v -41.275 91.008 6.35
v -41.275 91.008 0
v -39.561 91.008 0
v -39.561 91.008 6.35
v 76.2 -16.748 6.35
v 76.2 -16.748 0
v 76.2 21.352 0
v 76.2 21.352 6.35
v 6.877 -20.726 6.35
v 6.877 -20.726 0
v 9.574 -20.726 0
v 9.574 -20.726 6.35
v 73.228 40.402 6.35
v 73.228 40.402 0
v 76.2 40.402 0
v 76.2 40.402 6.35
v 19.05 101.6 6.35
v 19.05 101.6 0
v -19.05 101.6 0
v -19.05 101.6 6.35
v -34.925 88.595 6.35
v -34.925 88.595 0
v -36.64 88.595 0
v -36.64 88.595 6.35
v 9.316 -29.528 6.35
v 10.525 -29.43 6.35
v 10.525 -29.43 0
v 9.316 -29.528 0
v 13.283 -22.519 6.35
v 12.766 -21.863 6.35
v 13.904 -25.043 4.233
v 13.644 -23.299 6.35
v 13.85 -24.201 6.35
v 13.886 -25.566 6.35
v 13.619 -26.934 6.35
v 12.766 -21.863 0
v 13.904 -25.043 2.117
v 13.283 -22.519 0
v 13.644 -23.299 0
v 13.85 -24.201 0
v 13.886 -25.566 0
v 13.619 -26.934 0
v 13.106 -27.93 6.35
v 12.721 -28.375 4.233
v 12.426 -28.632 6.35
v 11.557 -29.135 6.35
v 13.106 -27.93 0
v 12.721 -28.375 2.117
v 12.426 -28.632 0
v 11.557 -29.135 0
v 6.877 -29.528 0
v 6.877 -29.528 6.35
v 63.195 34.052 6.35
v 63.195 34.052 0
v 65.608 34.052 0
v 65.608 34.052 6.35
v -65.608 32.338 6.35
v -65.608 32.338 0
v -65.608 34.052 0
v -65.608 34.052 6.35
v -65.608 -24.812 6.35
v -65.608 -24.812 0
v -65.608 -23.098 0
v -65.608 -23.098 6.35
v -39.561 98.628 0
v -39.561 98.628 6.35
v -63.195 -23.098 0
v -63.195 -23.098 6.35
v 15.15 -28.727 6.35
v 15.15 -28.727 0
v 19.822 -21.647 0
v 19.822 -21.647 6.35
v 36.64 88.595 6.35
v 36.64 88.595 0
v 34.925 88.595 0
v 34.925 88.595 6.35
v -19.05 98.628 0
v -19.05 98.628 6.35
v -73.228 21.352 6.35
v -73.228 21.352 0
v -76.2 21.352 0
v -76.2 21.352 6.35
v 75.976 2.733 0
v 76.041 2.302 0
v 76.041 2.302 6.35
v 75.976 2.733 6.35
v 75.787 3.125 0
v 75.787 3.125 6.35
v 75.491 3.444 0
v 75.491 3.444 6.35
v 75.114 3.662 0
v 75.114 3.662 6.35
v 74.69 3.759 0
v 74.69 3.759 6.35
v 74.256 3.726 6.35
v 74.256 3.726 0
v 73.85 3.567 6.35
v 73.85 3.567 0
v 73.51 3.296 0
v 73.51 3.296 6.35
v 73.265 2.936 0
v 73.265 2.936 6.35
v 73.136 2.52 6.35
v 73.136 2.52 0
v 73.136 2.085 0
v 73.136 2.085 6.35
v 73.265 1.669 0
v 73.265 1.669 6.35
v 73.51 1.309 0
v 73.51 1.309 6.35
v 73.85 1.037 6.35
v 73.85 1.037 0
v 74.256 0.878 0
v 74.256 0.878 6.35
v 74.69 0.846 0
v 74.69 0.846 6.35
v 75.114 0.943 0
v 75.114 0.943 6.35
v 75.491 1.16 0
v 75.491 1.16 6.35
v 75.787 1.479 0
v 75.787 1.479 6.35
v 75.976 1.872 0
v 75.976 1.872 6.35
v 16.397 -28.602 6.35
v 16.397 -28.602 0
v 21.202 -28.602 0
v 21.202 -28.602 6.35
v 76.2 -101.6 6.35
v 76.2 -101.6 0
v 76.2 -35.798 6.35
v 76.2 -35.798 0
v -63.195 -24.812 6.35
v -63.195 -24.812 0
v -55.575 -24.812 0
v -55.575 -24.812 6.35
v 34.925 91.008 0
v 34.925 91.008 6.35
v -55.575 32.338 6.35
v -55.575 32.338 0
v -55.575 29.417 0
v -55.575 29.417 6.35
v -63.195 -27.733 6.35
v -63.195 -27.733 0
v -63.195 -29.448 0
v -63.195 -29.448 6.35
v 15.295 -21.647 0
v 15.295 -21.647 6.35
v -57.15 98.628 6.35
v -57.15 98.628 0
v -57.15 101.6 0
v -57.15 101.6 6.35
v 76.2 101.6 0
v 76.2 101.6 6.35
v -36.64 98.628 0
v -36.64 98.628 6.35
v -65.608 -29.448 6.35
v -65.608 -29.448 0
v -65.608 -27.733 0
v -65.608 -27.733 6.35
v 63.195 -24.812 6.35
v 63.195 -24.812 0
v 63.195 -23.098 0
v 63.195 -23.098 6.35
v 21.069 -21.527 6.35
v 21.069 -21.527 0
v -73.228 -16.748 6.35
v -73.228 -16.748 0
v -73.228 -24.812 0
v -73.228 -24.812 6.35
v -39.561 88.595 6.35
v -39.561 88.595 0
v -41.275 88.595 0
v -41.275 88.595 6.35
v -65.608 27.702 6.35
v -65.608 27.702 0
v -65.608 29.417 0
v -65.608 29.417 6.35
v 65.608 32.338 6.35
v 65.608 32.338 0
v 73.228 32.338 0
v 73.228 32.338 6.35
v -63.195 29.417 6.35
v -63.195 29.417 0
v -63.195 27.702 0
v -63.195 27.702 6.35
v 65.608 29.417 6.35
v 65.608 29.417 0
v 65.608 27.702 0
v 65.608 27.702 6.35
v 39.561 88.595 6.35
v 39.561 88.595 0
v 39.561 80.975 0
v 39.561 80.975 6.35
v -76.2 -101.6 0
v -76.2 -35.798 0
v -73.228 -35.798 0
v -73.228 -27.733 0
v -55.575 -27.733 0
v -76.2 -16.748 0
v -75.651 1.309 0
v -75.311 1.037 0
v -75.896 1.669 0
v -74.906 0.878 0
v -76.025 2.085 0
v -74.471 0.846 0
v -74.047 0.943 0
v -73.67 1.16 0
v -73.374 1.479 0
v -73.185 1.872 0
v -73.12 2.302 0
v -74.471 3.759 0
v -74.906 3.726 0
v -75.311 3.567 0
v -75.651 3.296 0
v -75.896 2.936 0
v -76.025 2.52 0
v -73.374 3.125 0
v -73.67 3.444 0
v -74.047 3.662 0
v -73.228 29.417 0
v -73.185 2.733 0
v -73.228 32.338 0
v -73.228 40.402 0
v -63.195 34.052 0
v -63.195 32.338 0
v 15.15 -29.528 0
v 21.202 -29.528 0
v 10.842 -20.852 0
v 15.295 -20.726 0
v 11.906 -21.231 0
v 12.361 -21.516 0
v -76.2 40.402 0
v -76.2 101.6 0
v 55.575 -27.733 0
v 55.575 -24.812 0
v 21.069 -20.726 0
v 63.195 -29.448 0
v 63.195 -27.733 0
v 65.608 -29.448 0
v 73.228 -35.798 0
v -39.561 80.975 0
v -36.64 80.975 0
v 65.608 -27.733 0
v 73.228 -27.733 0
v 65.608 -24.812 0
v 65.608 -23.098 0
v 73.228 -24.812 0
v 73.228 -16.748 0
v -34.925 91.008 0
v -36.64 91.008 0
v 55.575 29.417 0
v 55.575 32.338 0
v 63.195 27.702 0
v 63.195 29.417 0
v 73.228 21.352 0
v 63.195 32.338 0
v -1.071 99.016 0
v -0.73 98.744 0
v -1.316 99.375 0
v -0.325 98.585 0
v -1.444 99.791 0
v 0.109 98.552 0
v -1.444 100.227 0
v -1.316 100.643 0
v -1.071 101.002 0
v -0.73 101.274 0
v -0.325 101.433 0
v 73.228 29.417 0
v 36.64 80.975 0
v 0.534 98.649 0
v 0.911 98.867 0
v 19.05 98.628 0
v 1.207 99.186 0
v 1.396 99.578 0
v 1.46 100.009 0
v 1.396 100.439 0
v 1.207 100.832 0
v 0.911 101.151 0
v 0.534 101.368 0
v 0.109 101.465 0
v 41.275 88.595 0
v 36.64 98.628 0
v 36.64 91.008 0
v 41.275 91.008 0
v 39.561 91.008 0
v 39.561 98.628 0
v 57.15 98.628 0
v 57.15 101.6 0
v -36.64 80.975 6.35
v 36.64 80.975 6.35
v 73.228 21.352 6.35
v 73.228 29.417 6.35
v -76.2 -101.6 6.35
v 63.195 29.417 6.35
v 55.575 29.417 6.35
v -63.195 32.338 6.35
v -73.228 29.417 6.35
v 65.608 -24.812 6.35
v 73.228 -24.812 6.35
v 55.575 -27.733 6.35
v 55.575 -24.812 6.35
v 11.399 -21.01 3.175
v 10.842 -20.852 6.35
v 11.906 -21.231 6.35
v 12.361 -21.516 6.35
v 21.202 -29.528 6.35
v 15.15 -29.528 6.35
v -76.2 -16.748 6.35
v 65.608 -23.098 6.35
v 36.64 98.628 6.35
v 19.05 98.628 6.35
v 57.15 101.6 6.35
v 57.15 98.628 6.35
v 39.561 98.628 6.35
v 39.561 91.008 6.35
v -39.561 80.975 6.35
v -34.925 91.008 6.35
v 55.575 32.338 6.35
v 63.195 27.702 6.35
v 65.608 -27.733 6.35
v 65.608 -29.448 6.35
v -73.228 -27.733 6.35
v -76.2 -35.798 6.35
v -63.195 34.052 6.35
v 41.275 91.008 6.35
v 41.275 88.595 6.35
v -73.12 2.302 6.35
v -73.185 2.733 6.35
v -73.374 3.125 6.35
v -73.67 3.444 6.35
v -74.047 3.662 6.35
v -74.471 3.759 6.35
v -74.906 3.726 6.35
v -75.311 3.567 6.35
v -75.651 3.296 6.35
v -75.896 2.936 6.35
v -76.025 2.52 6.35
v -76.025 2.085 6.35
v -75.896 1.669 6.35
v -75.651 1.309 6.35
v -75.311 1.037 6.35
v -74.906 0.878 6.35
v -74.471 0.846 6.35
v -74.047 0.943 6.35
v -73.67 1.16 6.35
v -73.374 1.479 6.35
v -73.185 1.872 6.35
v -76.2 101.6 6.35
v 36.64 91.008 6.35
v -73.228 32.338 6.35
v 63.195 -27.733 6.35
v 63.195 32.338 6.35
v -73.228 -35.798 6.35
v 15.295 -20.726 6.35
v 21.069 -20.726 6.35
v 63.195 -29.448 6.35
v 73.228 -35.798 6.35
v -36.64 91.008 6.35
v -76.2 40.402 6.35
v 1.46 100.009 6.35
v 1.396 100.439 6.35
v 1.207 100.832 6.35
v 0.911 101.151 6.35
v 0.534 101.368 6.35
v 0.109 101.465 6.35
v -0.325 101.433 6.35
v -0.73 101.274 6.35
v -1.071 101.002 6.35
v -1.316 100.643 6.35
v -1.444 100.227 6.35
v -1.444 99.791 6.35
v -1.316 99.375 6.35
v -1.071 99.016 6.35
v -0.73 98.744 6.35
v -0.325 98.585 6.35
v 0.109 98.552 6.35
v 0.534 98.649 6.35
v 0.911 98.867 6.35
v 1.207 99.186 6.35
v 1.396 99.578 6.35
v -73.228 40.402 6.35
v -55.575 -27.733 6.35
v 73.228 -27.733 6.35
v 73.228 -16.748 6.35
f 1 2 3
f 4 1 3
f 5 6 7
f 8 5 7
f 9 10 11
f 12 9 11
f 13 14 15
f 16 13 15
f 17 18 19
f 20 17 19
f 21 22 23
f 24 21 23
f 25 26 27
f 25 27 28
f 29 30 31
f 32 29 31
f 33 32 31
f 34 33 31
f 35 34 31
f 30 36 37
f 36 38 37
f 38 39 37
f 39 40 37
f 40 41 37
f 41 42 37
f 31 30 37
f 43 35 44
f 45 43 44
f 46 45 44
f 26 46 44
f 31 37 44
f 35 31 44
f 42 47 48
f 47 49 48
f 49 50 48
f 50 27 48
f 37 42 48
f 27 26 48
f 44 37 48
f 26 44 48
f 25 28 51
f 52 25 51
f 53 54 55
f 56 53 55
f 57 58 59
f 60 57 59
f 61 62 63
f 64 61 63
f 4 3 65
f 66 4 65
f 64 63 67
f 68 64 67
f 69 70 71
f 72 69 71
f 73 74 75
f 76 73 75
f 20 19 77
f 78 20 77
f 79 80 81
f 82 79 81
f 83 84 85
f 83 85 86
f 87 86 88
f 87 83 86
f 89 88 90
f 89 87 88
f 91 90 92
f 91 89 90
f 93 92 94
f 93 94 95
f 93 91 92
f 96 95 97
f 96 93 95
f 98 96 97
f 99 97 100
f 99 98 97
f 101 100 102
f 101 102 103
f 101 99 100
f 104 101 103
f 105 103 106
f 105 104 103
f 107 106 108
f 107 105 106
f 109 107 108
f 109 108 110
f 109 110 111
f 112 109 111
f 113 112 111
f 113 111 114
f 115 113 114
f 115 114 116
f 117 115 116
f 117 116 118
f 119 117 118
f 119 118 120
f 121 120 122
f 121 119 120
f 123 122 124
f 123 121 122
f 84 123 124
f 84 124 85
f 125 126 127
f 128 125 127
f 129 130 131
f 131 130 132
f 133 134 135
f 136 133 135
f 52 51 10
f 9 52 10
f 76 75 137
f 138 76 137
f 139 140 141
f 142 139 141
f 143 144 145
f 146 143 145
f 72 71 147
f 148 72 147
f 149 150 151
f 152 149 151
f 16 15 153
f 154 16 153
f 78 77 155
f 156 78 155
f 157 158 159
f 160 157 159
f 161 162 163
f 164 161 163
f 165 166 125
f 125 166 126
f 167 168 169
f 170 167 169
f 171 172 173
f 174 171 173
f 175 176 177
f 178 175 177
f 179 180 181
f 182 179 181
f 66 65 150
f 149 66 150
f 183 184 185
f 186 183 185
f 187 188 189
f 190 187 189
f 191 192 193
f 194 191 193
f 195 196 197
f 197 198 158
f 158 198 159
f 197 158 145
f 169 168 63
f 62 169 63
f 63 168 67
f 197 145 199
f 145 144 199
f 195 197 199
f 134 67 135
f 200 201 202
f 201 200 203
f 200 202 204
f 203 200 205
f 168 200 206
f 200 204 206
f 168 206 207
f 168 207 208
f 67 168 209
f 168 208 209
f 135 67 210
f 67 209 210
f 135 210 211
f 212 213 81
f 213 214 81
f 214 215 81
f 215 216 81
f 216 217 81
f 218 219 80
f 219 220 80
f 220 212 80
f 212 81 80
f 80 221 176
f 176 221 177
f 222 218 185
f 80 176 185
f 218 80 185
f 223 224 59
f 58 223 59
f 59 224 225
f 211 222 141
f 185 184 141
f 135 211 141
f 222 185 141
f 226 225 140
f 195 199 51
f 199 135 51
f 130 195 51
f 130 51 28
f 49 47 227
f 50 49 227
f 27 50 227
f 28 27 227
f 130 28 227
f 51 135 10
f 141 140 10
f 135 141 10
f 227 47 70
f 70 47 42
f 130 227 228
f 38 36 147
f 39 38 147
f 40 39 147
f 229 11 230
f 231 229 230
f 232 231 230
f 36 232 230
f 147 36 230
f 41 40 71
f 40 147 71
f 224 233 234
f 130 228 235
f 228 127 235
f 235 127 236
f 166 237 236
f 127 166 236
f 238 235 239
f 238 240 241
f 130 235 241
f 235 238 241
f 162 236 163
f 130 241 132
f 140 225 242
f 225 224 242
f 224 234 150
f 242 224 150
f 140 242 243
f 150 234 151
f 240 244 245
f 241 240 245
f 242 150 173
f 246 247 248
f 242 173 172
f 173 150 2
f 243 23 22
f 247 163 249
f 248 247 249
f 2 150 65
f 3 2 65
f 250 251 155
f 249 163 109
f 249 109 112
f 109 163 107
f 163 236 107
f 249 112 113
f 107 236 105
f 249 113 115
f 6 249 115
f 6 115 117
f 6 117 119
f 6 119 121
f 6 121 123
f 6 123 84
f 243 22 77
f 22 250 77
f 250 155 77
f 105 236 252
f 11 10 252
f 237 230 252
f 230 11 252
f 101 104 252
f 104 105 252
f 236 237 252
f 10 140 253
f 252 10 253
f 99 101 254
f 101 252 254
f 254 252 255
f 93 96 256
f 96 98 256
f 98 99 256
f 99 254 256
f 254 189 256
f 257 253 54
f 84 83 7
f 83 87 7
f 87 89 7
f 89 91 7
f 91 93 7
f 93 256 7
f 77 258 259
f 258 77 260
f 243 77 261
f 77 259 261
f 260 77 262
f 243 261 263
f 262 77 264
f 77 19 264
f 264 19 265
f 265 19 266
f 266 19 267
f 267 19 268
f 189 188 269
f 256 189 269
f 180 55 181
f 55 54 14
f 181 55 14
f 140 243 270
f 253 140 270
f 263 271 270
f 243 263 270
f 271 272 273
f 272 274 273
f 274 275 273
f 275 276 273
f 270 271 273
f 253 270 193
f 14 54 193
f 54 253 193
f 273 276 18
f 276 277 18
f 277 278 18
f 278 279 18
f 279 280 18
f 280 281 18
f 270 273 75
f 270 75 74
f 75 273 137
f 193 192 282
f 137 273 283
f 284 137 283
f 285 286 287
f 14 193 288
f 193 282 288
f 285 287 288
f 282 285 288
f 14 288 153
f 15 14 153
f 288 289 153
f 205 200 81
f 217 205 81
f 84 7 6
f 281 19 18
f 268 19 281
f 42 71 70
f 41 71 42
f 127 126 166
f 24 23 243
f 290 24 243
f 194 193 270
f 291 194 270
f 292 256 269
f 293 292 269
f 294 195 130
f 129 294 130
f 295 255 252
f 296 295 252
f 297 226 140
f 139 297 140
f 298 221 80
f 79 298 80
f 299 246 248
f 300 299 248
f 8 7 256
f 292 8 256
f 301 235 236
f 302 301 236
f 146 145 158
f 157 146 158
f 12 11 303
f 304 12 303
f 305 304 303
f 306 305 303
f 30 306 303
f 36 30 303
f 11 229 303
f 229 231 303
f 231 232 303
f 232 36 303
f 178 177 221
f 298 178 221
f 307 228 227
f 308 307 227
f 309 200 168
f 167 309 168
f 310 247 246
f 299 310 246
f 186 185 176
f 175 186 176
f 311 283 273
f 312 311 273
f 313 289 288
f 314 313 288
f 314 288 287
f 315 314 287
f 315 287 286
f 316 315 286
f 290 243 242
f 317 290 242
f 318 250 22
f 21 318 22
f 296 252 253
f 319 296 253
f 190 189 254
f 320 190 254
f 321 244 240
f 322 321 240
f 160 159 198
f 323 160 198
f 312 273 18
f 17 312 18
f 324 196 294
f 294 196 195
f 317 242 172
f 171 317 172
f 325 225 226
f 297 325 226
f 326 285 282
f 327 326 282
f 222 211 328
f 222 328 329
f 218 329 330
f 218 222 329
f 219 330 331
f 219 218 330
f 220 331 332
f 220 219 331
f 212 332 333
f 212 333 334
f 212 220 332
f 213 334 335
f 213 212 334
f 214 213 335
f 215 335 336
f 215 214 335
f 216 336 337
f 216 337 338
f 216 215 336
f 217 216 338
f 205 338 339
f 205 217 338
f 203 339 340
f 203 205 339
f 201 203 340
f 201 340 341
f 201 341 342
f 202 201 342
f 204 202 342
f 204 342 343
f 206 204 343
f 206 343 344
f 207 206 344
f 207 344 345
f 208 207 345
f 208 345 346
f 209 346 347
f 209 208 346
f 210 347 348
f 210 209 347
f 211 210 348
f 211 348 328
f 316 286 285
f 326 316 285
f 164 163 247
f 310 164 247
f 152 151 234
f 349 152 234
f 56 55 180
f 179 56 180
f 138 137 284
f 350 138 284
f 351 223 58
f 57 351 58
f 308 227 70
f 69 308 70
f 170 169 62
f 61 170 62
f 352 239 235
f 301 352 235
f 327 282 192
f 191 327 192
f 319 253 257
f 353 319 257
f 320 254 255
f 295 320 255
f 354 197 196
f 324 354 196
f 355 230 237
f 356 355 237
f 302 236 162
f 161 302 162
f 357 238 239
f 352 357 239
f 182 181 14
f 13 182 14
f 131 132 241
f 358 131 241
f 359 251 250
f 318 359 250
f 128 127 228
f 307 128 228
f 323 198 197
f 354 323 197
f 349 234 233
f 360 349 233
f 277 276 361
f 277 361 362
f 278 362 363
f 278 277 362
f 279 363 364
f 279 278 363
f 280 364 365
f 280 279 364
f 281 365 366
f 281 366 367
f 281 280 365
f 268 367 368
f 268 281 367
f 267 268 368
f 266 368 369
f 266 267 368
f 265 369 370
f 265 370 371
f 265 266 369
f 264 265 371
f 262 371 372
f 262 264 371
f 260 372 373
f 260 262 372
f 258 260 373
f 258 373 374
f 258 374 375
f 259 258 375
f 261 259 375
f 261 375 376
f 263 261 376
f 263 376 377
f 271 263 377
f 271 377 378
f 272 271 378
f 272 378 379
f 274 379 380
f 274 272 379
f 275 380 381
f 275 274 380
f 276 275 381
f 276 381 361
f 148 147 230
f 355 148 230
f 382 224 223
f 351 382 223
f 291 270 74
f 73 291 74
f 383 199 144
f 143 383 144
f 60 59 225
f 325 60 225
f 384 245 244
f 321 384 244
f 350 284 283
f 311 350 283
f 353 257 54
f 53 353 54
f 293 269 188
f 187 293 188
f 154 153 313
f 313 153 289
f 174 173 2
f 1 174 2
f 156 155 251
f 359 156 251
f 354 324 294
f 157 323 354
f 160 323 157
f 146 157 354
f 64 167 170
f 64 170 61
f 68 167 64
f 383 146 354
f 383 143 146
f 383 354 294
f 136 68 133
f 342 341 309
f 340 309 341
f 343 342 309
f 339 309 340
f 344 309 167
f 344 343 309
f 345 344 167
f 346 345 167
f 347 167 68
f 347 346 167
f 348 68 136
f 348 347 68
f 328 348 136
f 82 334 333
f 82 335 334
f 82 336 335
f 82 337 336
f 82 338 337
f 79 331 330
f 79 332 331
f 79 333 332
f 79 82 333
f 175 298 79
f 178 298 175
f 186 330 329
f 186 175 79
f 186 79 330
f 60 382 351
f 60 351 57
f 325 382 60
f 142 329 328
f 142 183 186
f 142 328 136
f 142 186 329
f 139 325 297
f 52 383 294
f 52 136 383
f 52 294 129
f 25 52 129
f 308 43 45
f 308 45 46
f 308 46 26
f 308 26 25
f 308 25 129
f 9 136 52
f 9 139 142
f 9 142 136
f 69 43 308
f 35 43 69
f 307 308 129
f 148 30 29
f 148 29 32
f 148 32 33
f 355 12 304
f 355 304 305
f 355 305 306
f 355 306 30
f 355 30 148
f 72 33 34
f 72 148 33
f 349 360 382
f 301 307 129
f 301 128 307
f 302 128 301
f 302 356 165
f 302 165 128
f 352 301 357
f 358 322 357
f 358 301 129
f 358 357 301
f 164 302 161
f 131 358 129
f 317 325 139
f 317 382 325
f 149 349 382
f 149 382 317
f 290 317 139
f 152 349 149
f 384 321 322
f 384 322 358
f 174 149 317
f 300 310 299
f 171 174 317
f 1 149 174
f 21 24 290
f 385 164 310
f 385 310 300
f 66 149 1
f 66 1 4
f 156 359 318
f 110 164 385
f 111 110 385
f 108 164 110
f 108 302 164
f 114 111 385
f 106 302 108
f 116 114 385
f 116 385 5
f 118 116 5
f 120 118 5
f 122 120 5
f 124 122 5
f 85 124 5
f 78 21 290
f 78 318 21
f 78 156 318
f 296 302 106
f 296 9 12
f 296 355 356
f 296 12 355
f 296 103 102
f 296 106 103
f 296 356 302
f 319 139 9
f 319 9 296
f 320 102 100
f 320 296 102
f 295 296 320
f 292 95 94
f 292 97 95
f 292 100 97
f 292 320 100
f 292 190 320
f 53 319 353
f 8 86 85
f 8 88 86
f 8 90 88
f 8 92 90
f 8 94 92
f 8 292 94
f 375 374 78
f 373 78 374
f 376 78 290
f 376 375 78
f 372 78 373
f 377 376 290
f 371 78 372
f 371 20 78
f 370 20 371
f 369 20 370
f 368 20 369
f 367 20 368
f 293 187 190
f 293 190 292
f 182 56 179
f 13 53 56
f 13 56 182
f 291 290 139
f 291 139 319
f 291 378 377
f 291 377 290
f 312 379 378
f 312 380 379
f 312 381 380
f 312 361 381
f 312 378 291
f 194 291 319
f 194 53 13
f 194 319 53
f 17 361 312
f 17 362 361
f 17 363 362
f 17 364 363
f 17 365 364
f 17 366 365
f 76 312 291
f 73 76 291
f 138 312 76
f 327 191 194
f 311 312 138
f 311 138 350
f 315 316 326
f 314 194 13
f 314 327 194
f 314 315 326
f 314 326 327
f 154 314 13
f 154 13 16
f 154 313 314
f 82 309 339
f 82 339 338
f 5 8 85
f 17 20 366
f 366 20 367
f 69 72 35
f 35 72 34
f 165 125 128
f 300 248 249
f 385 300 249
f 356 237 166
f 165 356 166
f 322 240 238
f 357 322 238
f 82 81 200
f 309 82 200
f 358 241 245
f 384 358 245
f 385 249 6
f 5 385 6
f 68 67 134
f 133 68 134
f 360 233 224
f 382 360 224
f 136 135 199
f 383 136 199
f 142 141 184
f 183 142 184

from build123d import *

# Parameters (mm, degrees)
F0_R     = 1.4605
F1_DEPTH = 6.35


# Not quite as in the source:
# - a feature names something its author has since deleted; it is built from what else it names


with BuildPart() as f1:
    # F0 (on Top) → F1 (new body)
    with BuildSketch(Plane.XY):
        Polygon((-57.1500000004, 101.5999999999), (-76.2, 101.5999999999), (-76.2, 40.4022223395), (-73.2282, 40.4022223395), (-73.2282, 32.3377223395), (-65.6082, 32.3377223395), (-65.6082, 34.0522223395), (-63.1952, 34.0522223395), (-63.1952, 32.3377223395), (-55.5752, 32.3377223395), (-55.5752, 30.8772223395), (-55.5752, 29.4167223395), (-63.1952, 29.4167223395), (-63.1952, 27.7022223395), (-65.6082, 27.7022223395), (-65.6082, 29.4167223395), (-73.2282, 29.4167223395), (-73.2282, 21.3522223395), (-76.2, 21.3522223395), (-76.2, -16.7477776605), (-73.2282, -16.7477776605), (-73.2282, -24.8122776605), (-65.6082, -24.8122776605), (-65.6082, -23.0977776605), (-63.1952, -23.0977776605), (-63.1952, -24.8122776605), (-55.5752, -24.8122776605), (-55.5752, -26.2727776605), (-55.5752, -27.7332776605), (-63.1952, -27.7332776605), (-63.1952, -29.4477776605), (-65.6082, -29.4477776605), (-65.6082, -27.7332776605), (-73.2282, -27.7332776605), (-73.2282, -35.7977776604), (-76.2, -35.7977776604), (-76.2, -101.5999999999), (76.2, -101.5999999999), (76.2, -35.7977776604), (73.2282, -35.7977776604), (73.2282, -27.7332776605), (65.6082, -27.7332776605), (65.6082, -29.4477776605), (63.1952, -29.4477776605), (63.1952, -27.7332776605), (55.5752, -27.7332776605), (55.5752, -26.2727776605), (55.5752, -24.8122776605), (63.1952, -24.8122776605), (63.1952, -23.0977776605), (65.6082, -23.0977776605), (65.6082, -24.8122776605), (73.2282, -24.8122776605), (73.2282, -16.7477776605), (76.2, -16.7477776605), (76.2, 21.3522223395), (73.2282, 21.3522223395), (73.2282, 29.4167223395), (65.6082, 29.4167223395), (65.6082, 27.7022223395), (63.1952, 27.7022223395), (63.1952, 29.4167223395), (55.5752, 29.4167223395), (55.5752, 30.8772223395), (55.5752, 32.3377223395), (63.1952, 32.3377223395), (63.1952, 34.0522223395), (65.6082, 34.0522223395), (65.6082, 32.3377223395), (73.2282, 32.3377223395), (73.2282, 40.4022223395), (76.2, 40.4022223395), (76.2, 101.5999999999), (57.1499999998, 101.5999999999), (57.1499999998, 98.6281999999), (39.5605000002, 98.6281999999), (39.5605000002, 91.0081999999), (41.2750000002, 91.0081999999), (41.2750000002, 88.5951999999), (39.5605000002, 88.5951999999), (39.5605000002, 80.9751999999), (38.1000000002, 80.9751999999), (36.6395000002, 80.9751999999), (36.6395000002, 88.5951999999), (34.9250000002, 88.5951999999), (34.9250000002, 91.0081999999), (36.6395000002, 91.0081999999), (36.6395000002, 98.6281999999), (19.05, 98.6281999999), (19.05, 101.5999999999), (-19.05, 101.5999999999), (-19.05, 98.6281999999), (-21.3974503974, 98.6281999999), (-36.6395000002, 98.6281999999), (-36.6395000002, 91.0081999999), (-34.9250000002, 91.0081999999), (-34.9250000002, 88.5951999999), (-36.6395000002, 88.5951999999), (-36.6395000002, 80.9751999999), (-38.1000000002, 80.9751999999), (-39.5605000002, 80.9751999999), (-39.5605000002, 88.5951999999), (-41.2750000002, 88.5951999999), (-41.2750000002, 91.0081999999), (-39.5605000002, 91.0081999999), (-39.5605000002, 98.6281999999), (-57.1500000004, 98.6281999999), align=None)
        with BuildLine():
            add(Edge.make_bspline(
                [(12.7658935974, -21.8633876268), (13.9035680881, -23.0010621174), (13.9035680881, -25.0432889762)],
                knots=[0, 0, 0, 1, 1, 1], degree=2))
            add(Edge.make_bspline(
                [(13.9035680881, -25.0432889762), (13.9035680881, -27.2223065019), (12.7206178133, -28.3753940255)],
                knots=[0, 0, 0, 1, 1, 1], degree=2))
            add(Edge.make_bspline(
                [(12.7206178133, -28.3753940255), (11.5376675385, -29.5284815491), (9.3162641723, -29.5284815491)],
                knots=[0, 0, 0, 1, 1, 1], degree=2))
            Line((9.3162641723, -29.5284815491), (6.8771517165, -29.5284815491))
            Line((6.8771517165, -29.5284815491), (6.8771517165, -20.7257131361))
            Line((6.8771517165, -20.7257131361), (9.5744324733, -20.7257131361))
            add(Edge.make_bspline(
                [(9.5744324733, -20.7257131361), (11.6282191068, -20.7257131361), (12.7658935974, -21.8633876268)],
                knots=[0, 0, 0, 1, 1, 1], degree=2))
        make_face(mode=Mode.SUBTRACT)
        Polygon((21.2016391646, -28.6017729462), (21.2016391646, -29.5284815491), (15.1500971236, -29.5284815491), (15.1500971236, -28.7270038385), (19.8221727203, -21.6466418517), (15.294594307, -21.6466418517), (15.294594307, -20.7257131361), (21.0687017558, -20.7257131361), (21.0687017558, -21.5271908467), (16.3966261591, -28.6017729462), align=None, mode=Mode.SUBTRACT)
        with Locations((-74.5805352926, 2.3022223395)):
            Circle(F0_R, mode=Mode.SUBTRACT)
        with Locations((74.5805352926, 2.3022223395)):
            Circle(F0_R, mode=Mode.SUBTRACT)
        with Locations((0, 100.0089123845)):
            Circle(F0_R, mode=Mode.SUBTRACT)
    extrude(amount=F1_DEPTH)


solid = f1.part
